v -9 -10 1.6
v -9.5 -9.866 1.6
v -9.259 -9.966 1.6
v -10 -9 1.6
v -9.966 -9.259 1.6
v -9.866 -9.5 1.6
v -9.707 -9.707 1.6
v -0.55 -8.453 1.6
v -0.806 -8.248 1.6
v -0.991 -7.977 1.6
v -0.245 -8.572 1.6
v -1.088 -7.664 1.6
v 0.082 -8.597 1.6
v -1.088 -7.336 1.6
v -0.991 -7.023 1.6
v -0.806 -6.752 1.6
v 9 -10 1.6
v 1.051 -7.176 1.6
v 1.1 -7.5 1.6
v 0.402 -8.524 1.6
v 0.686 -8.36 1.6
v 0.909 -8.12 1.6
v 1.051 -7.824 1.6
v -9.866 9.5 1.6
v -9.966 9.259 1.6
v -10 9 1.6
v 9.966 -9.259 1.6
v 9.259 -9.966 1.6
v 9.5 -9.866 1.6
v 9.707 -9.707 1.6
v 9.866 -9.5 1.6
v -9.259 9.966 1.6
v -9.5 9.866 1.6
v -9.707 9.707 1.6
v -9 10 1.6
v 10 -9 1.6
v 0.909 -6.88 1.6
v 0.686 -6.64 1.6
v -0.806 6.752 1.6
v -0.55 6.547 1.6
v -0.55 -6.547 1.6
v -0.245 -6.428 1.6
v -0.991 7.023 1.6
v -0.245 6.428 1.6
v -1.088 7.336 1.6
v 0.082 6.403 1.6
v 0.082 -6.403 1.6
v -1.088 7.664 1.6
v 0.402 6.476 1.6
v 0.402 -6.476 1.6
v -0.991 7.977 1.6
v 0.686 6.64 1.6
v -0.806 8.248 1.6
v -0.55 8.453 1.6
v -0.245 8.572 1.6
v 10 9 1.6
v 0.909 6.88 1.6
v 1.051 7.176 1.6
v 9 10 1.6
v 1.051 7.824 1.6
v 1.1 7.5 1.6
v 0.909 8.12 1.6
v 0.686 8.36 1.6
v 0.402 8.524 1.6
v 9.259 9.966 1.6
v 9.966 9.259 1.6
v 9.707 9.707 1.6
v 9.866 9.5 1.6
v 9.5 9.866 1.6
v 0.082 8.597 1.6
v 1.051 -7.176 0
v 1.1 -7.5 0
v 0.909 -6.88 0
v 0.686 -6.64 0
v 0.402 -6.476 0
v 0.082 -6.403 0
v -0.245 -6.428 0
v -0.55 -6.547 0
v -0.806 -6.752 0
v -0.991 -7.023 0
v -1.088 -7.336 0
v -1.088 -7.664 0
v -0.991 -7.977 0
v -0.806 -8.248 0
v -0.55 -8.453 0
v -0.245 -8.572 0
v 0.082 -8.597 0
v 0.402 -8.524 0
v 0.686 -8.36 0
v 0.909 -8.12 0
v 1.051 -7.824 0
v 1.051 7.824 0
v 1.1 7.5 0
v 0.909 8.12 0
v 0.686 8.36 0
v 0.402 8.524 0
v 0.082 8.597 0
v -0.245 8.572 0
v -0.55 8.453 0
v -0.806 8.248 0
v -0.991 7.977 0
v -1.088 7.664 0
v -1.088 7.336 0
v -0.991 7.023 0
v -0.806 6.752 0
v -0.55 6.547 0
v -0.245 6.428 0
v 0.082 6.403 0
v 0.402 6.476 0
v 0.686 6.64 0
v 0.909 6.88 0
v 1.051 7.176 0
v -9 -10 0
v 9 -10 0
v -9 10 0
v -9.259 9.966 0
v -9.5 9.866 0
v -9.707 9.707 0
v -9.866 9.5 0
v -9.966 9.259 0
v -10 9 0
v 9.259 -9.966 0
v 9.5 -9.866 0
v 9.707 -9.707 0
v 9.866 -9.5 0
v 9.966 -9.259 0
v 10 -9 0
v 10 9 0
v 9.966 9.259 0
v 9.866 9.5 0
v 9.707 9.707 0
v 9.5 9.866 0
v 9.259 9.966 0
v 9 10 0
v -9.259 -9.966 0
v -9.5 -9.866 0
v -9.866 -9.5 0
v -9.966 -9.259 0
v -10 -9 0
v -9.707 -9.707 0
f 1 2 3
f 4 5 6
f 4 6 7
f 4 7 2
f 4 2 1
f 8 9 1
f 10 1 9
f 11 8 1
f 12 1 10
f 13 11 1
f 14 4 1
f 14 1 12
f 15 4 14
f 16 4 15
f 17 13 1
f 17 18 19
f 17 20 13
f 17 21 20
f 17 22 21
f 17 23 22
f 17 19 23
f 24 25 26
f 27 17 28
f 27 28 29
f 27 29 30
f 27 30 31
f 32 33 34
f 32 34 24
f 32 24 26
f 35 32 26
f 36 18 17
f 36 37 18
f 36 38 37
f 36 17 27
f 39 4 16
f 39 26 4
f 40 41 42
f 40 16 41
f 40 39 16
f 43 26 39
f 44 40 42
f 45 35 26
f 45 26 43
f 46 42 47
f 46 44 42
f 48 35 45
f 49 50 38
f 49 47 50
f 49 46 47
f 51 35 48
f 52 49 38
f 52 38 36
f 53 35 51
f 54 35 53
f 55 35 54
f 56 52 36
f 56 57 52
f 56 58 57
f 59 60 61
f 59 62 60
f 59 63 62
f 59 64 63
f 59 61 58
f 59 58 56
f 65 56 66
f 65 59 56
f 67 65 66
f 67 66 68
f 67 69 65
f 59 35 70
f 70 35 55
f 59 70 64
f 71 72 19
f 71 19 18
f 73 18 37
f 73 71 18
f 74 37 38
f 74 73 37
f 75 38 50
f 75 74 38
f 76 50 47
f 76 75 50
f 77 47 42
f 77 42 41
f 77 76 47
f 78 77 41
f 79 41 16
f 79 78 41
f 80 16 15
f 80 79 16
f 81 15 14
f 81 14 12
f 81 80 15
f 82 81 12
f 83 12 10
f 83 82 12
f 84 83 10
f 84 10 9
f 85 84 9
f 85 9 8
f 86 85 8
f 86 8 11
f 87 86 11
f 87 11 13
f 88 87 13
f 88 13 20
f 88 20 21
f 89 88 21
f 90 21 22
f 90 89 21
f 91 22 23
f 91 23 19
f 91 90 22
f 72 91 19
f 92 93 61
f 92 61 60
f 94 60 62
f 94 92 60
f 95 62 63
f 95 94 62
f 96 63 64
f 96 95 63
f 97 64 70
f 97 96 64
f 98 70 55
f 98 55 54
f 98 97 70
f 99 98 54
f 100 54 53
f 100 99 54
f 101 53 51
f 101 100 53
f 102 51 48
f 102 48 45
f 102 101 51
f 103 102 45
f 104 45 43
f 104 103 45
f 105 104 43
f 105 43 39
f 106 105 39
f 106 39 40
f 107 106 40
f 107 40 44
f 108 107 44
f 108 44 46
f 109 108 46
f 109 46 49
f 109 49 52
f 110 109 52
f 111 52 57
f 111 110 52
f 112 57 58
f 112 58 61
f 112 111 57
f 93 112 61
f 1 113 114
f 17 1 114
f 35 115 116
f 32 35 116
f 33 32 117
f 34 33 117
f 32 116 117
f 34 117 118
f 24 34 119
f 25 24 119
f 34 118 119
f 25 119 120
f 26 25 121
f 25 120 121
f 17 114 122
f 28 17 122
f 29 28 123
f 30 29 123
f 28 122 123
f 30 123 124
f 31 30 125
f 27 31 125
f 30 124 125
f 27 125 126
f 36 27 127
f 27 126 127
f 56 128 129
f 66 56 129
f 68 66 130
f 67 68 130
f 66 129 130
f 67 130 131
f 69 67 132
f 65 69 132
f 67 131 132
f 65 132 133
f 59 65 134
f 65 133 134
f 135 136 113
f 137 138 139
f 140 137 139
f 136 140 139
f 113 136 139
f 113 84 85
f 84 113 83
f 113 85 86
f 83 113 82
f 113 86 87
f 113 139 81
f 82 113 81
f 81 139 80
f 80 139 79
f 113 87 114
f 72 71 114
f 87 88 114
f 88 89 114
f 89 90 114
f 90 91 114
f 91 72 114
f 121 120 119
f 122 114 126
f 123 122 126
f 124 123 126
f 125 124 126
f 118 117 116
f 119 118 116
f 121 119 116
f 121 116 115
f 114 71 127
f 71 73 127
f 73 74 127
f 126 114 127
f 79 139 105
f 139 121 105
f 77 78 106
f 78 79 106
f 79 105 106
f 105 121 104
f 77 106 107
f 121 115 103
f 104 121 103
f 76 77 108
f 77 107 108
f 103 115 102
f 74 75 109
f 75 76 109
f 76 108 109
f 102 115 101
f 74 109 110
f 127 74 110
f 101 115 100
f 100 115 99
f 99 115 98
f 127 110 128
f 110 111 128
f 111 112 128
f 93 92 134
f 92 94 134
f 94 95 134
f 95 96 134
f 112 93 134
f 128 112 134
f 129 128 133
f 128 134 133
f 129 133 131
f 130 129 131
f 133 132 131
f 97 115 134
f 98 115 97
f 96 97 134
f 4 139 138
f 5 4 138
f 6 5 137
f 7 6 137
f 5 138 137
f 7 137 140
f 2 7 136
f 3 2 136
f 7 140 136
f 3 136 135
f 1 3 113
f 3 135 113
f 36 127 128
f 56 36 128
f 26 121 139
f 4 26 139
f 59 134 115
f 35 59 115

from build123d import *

# Parameters (mm, degrees)
SKETCH_1_R                             = 1.1
PCB20X20_T1P6_2NPTH_D2P2_PITCH15_DEPTH = 1.6


with BuildPart() as part:
    # 草图1 → PCB20x20_T1p6_2NPTH_D2p2_pitch15 (new body)
    with BuildSketch(Plane.XY):
        with BuildLine():
            Line((-9, -10), (9, -10))
            ThreePointArc((9, -10), (9.707106781, -9.707106781), (10, -9))
            Line((10, -9), (10, 9))
            ThreePointArc((10, 9), (9.707106781, 9.707106781), (9, 10))
            Line((9, 10), (-9, 10))
            ThreePointArc((-9, 10), (-9.707106781, 9.707106781), (-10, 9))
            Line((-10, 9), (-10, -9))
            ThreePointArc((-10, -9), (-9.707106781, -9.707106781), (-9, -10))
        make_face()
        with Locations((0, -7.5)):
            Circle(SKETCH_1_R, mode=Mode.SUBTRACT)
        with Locations((0, 7.5)):
            Circle(SKETCH_1_R, mode=Mode.SUBTRACT)
    extrude(amount=PCB20X20_T1P6_2NPTH_D2P2_PITCH15_DEPTH)


solid = part.part
